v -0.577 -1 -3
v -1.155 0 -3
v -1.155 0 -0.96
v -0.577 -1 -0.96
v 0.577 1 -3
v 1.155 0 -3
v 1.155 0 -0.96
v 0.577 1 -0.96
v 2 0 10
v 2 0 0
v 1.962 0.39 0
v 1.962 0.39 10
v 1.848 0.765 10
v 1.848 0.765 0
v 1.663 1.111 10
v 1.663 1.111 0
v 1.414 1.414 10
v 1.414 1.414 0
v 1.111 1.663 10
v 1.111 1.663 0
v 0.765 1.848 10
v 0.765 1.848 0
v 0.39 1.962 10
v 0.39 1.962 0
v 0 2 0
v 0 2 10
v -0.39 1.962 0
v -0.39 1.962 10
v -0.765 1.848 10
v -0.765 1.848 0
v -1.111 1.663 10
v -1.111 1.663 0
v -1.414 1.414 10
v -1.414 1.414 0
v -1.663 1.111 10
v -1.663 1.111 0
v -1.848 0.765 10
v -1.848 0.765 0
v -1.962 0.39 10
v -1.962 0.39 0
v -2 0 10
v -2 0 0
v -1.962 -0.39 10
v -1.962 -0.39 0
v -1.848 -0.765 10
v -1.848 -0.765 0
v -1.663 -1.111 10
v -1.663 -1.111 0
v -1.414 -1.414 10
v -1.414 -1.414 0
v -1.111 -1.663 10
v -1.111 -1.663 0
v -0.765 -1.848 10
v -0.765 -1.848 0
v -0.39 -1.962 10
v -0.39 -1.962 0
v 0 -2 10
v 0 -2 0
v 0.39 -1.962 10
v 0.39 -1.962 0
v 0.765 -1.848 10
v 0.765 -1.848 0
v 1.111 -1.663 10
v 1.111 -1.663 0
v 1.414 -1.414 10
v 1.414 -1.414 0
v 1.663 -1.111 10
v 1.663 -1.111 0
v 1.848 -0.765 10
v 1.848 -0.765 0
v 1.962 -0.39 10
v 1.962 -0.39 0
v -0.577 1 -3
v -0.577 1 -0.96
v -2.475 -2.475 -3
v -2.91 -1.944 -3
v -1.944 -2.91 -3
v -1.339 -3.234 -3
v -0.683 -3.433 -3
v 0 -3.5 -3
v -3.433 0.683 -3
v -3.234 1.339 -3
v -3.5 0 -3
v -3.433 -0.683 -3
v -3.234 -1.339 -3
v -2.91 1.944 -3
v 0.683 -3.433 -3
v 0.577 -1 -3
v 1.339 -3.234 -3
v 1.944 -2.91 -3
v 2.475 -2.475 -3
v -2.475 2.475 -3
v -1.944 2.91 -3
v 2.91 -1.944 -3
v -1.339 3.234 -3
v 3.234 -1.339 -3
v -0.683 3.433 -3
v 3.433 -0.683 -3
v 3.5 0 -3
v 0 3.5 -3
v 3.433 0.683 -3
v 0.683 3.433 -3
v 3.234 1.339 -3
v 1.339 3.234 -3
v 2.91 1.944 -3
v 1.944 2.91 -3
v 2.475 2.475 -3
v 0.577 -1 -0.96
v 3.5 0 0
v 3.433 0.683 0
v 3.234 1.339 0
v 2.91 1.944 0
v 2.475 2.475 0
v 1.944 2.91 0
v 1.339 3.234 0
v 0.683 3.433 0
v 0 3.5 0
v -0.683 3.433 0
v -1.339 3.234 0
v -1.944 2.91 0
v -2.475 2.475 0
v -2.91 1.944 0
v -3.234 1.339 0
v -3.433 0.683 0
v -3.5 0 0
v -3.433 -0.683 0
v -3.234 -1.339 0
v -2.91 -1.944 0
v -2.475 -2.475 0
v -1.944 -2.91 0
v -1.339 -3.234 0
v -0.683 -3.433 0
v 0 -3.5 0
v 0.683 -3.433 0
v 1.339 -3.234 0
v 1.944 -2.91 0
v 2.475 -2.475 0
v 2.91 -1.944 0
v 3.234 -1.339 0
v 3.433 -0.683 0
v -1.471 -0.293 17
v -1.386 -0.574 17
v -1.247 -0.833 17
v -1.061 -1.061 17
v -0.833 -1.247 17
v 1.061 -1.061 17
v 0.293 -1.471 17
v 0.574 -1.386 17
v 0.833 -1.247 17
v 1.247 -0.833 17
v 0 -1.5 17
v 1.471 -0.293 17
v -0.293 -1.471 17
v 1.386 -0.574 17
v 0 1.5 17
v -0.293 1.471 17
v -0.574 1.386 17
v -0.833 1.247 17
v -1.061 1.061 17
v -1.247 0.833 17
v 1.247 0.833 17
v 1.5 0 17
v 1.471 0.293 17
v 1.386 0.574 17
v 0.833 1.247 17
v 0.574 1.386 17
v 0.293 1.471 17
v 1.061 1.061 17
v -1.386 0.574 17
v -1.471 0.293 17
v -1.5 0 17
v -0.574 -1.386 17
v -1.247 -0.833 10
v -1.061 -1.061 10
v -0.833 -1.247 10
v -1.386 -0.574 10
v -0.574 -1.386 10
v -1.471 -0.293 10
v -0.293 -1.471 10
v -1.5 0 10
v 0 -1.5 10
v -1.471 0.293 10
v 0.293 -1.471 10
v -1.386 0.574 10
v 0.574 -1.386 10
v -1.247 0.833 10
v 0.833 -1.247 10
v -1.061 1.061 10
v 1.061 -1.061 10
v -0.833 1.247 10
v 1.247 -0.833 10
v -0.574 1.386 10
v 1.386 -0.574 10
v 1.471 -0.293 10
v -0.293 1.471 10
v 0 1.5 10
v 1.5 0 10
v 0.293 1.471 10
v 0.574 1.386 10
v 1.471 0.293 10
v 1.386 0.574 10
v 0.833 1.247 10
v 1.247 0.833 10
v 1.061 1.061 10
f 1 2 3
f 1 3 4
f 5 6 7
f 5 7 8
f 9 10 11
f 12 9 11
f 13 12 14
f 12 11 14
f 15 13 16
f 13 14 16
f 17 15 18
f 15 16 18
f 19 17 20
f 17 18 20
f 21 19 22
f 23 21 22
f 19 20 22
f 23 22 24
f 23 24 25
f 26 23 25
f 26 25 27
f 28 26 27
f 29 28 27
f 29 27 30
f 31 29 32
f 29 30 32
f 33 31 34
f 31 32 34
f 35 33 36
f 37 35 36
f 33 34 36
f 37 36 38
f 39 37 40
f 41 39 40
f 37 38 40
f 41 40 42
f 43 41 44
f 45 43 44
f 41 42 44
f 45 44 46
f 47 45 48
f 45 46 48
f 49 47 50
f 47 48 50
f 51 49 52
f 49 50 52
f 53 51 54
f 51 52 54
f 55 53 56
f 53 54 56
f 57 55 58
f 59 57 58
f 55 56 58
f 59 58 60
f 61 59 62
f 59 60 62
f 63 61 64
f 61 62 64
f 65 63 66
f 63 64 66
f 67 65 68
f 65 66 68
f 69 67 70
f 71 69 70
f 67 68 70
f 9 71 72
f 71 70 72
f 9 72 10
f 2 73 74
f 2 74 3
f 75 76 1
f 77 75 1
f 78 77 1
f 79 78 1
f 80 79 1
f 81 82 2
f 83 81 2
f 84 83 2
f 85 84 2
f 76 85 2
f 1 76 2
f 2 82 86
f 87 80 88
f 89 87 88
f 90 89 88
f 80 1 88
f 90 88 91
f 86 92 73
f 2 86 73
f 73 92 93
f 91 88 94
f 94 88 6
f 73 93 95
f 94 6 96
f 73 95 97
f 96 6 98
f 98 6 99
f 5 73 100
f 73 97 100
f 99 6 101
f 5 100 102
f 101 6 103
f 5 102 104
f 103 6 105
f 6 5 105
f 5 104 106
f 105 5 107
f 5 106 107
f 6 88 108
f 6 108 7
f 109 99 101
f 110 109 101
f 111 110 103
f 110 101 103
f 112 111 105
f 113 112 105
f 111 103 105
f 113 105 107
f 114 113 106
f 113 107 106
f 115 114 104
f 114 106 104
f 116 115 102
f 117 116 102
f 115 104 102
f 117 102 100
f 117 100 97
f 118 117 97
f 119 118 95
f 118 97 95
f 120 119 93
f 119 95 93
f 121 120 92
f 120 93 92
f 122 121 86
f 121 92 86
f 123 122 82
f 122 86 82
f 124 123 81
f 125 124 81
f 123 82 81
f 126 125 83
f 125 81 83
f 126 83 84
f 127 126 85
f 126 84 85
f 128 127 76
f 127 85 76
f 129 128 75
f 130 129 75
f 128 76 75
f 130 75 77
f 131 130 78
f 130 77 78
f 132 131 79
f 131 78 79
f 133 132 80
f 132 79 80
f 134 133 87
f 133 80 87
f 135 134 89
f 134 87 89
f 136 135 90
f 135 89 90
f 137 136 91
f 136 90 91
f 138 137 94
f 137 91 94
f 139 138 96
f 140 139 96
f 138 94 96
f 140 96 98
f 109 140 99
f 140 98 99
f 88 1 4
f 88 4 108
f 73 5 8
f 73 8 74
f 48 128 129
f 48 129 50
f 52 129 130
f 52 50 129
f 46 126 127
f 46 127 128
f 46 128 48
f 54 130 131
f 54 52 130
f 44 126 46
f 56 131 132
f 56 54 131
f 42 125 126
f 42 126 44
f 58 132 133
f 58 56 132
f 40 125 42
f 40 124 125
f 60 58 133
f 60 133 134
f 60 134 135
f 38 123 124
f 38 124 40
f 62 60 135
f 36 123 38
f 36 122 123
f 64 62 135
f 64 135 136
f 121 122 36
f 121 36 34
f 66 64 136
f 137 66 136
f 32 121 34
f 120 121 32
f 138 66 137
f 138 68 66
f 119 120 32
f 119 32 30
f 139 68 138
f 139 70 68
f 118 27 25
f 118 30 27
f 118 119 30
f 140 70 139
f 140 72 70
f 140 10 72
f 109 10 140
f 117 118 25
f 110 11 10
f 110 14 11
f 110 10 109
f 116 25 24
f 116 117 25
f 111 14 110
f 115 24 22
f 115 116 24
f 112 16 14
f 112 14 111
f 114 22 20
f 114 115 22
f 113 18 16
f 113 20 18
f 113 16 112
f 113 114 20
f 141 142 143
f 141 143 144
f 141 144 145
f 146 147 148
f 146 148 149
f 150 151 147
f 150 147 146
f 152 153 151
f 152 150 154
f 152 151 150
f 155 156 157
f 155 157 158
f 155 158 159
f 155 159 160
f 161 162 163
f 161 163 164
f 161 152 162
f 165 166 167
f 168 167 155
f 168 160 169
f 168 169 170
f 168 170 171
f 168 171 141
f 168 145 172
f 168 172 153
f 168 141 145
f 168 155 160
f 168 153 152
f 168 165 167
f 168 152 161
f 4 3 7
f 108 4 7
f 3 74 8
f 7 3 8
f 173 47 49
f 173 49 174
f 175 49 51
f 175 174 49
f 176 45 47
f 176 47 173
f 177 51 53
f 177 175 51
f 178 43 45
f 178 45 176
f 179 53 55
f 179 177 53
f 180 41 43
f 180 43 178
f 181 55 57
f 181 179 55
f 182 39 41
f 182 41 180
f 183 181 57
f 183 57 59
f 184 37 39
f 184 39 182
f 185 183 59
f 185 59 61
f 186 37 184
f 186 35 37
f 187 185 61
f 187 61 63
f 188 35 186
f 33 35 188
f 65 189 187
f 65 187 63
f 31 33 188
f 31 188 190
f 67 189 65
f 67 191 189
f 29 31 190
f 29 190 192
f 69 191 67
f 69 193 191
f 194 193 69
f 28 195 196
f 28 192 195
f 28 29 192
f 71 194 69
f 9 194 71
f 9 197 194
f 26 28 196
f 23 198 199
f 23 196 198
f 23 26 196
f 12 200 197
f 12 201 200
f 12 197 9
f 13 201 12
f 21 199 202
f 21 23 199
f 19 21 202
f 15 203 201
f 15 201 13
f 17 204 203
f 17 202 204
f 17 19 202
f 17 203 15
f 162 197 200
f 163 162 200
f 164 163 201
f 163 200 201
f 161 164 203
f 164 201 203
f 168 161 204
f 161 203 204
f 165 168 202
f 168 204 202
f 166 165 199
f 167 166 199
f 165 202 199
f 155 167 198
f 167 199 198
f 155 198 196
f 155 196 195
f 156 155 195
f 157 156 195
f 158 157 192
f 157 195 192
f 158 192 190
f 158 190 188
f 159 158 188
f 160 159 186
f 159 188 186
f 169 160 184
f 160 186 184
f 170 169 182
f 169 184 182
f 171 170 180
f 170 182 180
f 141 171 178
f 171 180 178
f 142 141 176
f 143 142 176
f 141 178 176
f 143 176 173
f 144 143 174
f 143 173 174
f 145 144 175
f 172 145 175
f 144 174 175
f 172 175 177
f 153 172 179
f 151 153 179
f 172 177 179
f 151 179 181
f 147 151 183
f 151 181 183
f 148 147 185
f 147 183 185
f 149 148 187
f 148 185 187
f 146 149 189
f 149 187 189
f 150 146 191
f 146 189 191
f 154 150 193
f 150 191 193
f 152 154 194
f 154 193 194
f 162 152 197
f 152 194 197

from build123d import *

# Parameters (mm, degrees)
F_01_START                             = -3
S01_SOCKET_HEAD_R                      = 3.5
F_01_SOCKET_HEAD_DEPTH                 = 3
S02_GROUND_SHOULDER_R                  = 2
F_02_GROUND_SHOULDER_DEPTH             = 10
F_03_START                             = 10
S03_THREADED_TIP_MAJOR_DIAMETER_R      = 1.5
F_03_THREADED_TIP_MAJOR_DIAMETER_DEPTH = 7
F_04_START                             = -3.1
F_04_HEXAGONAL_DRIVE_DEPTH             = 2.14


with BuildPart() as part:
    # S01 - Socket head → 01 - Socket head (new body)
    with BuildSketch(Plane.XY.offset(F_01_START)):
        Circle(S01_SOCKET_HEAD_R)
    extrude(amount=F_01_SOCKET_HEAD_DEPTH)

    # S02 - Ground shoulder → 02 - Ground shoulder (add)
    with BuildSketch(Plane.XY):
        Circle(S02_GROUND_SHOULDER_R)
    extrude(amount=F_02_GROUND_SHOULDER_DEPTH)

    # S03 - Threaded tip major diameter → 03 - Threaded tip major diameter (add)
    with BuildSketch(Plane.XY.offset(F_03_START)):
        Circle(S03_THREADED_TIP_MAJOR_DIAMETER_R)
    extrude(amount=F_03_THREADED_TIP_MAJOR_DIAMETER_DEPTH)

    # S04 - Hexagonal drive → 04 - Hexagonal drive (cut)
    with BuildSketch(Plane.XY.offset(F_04_START)):
        Polygon((1.154700538, 0), (0.577350269, 1), (-0.577350269, 1), (-1.154700538, 0), (-0.577350269, -1), (0.577350269, -1), align=None)
    extrude(amount=F_04_HEXAGONAL_DRIVE_DEPTH, mode=Mode.SUBTRACT)


solid = part.part
